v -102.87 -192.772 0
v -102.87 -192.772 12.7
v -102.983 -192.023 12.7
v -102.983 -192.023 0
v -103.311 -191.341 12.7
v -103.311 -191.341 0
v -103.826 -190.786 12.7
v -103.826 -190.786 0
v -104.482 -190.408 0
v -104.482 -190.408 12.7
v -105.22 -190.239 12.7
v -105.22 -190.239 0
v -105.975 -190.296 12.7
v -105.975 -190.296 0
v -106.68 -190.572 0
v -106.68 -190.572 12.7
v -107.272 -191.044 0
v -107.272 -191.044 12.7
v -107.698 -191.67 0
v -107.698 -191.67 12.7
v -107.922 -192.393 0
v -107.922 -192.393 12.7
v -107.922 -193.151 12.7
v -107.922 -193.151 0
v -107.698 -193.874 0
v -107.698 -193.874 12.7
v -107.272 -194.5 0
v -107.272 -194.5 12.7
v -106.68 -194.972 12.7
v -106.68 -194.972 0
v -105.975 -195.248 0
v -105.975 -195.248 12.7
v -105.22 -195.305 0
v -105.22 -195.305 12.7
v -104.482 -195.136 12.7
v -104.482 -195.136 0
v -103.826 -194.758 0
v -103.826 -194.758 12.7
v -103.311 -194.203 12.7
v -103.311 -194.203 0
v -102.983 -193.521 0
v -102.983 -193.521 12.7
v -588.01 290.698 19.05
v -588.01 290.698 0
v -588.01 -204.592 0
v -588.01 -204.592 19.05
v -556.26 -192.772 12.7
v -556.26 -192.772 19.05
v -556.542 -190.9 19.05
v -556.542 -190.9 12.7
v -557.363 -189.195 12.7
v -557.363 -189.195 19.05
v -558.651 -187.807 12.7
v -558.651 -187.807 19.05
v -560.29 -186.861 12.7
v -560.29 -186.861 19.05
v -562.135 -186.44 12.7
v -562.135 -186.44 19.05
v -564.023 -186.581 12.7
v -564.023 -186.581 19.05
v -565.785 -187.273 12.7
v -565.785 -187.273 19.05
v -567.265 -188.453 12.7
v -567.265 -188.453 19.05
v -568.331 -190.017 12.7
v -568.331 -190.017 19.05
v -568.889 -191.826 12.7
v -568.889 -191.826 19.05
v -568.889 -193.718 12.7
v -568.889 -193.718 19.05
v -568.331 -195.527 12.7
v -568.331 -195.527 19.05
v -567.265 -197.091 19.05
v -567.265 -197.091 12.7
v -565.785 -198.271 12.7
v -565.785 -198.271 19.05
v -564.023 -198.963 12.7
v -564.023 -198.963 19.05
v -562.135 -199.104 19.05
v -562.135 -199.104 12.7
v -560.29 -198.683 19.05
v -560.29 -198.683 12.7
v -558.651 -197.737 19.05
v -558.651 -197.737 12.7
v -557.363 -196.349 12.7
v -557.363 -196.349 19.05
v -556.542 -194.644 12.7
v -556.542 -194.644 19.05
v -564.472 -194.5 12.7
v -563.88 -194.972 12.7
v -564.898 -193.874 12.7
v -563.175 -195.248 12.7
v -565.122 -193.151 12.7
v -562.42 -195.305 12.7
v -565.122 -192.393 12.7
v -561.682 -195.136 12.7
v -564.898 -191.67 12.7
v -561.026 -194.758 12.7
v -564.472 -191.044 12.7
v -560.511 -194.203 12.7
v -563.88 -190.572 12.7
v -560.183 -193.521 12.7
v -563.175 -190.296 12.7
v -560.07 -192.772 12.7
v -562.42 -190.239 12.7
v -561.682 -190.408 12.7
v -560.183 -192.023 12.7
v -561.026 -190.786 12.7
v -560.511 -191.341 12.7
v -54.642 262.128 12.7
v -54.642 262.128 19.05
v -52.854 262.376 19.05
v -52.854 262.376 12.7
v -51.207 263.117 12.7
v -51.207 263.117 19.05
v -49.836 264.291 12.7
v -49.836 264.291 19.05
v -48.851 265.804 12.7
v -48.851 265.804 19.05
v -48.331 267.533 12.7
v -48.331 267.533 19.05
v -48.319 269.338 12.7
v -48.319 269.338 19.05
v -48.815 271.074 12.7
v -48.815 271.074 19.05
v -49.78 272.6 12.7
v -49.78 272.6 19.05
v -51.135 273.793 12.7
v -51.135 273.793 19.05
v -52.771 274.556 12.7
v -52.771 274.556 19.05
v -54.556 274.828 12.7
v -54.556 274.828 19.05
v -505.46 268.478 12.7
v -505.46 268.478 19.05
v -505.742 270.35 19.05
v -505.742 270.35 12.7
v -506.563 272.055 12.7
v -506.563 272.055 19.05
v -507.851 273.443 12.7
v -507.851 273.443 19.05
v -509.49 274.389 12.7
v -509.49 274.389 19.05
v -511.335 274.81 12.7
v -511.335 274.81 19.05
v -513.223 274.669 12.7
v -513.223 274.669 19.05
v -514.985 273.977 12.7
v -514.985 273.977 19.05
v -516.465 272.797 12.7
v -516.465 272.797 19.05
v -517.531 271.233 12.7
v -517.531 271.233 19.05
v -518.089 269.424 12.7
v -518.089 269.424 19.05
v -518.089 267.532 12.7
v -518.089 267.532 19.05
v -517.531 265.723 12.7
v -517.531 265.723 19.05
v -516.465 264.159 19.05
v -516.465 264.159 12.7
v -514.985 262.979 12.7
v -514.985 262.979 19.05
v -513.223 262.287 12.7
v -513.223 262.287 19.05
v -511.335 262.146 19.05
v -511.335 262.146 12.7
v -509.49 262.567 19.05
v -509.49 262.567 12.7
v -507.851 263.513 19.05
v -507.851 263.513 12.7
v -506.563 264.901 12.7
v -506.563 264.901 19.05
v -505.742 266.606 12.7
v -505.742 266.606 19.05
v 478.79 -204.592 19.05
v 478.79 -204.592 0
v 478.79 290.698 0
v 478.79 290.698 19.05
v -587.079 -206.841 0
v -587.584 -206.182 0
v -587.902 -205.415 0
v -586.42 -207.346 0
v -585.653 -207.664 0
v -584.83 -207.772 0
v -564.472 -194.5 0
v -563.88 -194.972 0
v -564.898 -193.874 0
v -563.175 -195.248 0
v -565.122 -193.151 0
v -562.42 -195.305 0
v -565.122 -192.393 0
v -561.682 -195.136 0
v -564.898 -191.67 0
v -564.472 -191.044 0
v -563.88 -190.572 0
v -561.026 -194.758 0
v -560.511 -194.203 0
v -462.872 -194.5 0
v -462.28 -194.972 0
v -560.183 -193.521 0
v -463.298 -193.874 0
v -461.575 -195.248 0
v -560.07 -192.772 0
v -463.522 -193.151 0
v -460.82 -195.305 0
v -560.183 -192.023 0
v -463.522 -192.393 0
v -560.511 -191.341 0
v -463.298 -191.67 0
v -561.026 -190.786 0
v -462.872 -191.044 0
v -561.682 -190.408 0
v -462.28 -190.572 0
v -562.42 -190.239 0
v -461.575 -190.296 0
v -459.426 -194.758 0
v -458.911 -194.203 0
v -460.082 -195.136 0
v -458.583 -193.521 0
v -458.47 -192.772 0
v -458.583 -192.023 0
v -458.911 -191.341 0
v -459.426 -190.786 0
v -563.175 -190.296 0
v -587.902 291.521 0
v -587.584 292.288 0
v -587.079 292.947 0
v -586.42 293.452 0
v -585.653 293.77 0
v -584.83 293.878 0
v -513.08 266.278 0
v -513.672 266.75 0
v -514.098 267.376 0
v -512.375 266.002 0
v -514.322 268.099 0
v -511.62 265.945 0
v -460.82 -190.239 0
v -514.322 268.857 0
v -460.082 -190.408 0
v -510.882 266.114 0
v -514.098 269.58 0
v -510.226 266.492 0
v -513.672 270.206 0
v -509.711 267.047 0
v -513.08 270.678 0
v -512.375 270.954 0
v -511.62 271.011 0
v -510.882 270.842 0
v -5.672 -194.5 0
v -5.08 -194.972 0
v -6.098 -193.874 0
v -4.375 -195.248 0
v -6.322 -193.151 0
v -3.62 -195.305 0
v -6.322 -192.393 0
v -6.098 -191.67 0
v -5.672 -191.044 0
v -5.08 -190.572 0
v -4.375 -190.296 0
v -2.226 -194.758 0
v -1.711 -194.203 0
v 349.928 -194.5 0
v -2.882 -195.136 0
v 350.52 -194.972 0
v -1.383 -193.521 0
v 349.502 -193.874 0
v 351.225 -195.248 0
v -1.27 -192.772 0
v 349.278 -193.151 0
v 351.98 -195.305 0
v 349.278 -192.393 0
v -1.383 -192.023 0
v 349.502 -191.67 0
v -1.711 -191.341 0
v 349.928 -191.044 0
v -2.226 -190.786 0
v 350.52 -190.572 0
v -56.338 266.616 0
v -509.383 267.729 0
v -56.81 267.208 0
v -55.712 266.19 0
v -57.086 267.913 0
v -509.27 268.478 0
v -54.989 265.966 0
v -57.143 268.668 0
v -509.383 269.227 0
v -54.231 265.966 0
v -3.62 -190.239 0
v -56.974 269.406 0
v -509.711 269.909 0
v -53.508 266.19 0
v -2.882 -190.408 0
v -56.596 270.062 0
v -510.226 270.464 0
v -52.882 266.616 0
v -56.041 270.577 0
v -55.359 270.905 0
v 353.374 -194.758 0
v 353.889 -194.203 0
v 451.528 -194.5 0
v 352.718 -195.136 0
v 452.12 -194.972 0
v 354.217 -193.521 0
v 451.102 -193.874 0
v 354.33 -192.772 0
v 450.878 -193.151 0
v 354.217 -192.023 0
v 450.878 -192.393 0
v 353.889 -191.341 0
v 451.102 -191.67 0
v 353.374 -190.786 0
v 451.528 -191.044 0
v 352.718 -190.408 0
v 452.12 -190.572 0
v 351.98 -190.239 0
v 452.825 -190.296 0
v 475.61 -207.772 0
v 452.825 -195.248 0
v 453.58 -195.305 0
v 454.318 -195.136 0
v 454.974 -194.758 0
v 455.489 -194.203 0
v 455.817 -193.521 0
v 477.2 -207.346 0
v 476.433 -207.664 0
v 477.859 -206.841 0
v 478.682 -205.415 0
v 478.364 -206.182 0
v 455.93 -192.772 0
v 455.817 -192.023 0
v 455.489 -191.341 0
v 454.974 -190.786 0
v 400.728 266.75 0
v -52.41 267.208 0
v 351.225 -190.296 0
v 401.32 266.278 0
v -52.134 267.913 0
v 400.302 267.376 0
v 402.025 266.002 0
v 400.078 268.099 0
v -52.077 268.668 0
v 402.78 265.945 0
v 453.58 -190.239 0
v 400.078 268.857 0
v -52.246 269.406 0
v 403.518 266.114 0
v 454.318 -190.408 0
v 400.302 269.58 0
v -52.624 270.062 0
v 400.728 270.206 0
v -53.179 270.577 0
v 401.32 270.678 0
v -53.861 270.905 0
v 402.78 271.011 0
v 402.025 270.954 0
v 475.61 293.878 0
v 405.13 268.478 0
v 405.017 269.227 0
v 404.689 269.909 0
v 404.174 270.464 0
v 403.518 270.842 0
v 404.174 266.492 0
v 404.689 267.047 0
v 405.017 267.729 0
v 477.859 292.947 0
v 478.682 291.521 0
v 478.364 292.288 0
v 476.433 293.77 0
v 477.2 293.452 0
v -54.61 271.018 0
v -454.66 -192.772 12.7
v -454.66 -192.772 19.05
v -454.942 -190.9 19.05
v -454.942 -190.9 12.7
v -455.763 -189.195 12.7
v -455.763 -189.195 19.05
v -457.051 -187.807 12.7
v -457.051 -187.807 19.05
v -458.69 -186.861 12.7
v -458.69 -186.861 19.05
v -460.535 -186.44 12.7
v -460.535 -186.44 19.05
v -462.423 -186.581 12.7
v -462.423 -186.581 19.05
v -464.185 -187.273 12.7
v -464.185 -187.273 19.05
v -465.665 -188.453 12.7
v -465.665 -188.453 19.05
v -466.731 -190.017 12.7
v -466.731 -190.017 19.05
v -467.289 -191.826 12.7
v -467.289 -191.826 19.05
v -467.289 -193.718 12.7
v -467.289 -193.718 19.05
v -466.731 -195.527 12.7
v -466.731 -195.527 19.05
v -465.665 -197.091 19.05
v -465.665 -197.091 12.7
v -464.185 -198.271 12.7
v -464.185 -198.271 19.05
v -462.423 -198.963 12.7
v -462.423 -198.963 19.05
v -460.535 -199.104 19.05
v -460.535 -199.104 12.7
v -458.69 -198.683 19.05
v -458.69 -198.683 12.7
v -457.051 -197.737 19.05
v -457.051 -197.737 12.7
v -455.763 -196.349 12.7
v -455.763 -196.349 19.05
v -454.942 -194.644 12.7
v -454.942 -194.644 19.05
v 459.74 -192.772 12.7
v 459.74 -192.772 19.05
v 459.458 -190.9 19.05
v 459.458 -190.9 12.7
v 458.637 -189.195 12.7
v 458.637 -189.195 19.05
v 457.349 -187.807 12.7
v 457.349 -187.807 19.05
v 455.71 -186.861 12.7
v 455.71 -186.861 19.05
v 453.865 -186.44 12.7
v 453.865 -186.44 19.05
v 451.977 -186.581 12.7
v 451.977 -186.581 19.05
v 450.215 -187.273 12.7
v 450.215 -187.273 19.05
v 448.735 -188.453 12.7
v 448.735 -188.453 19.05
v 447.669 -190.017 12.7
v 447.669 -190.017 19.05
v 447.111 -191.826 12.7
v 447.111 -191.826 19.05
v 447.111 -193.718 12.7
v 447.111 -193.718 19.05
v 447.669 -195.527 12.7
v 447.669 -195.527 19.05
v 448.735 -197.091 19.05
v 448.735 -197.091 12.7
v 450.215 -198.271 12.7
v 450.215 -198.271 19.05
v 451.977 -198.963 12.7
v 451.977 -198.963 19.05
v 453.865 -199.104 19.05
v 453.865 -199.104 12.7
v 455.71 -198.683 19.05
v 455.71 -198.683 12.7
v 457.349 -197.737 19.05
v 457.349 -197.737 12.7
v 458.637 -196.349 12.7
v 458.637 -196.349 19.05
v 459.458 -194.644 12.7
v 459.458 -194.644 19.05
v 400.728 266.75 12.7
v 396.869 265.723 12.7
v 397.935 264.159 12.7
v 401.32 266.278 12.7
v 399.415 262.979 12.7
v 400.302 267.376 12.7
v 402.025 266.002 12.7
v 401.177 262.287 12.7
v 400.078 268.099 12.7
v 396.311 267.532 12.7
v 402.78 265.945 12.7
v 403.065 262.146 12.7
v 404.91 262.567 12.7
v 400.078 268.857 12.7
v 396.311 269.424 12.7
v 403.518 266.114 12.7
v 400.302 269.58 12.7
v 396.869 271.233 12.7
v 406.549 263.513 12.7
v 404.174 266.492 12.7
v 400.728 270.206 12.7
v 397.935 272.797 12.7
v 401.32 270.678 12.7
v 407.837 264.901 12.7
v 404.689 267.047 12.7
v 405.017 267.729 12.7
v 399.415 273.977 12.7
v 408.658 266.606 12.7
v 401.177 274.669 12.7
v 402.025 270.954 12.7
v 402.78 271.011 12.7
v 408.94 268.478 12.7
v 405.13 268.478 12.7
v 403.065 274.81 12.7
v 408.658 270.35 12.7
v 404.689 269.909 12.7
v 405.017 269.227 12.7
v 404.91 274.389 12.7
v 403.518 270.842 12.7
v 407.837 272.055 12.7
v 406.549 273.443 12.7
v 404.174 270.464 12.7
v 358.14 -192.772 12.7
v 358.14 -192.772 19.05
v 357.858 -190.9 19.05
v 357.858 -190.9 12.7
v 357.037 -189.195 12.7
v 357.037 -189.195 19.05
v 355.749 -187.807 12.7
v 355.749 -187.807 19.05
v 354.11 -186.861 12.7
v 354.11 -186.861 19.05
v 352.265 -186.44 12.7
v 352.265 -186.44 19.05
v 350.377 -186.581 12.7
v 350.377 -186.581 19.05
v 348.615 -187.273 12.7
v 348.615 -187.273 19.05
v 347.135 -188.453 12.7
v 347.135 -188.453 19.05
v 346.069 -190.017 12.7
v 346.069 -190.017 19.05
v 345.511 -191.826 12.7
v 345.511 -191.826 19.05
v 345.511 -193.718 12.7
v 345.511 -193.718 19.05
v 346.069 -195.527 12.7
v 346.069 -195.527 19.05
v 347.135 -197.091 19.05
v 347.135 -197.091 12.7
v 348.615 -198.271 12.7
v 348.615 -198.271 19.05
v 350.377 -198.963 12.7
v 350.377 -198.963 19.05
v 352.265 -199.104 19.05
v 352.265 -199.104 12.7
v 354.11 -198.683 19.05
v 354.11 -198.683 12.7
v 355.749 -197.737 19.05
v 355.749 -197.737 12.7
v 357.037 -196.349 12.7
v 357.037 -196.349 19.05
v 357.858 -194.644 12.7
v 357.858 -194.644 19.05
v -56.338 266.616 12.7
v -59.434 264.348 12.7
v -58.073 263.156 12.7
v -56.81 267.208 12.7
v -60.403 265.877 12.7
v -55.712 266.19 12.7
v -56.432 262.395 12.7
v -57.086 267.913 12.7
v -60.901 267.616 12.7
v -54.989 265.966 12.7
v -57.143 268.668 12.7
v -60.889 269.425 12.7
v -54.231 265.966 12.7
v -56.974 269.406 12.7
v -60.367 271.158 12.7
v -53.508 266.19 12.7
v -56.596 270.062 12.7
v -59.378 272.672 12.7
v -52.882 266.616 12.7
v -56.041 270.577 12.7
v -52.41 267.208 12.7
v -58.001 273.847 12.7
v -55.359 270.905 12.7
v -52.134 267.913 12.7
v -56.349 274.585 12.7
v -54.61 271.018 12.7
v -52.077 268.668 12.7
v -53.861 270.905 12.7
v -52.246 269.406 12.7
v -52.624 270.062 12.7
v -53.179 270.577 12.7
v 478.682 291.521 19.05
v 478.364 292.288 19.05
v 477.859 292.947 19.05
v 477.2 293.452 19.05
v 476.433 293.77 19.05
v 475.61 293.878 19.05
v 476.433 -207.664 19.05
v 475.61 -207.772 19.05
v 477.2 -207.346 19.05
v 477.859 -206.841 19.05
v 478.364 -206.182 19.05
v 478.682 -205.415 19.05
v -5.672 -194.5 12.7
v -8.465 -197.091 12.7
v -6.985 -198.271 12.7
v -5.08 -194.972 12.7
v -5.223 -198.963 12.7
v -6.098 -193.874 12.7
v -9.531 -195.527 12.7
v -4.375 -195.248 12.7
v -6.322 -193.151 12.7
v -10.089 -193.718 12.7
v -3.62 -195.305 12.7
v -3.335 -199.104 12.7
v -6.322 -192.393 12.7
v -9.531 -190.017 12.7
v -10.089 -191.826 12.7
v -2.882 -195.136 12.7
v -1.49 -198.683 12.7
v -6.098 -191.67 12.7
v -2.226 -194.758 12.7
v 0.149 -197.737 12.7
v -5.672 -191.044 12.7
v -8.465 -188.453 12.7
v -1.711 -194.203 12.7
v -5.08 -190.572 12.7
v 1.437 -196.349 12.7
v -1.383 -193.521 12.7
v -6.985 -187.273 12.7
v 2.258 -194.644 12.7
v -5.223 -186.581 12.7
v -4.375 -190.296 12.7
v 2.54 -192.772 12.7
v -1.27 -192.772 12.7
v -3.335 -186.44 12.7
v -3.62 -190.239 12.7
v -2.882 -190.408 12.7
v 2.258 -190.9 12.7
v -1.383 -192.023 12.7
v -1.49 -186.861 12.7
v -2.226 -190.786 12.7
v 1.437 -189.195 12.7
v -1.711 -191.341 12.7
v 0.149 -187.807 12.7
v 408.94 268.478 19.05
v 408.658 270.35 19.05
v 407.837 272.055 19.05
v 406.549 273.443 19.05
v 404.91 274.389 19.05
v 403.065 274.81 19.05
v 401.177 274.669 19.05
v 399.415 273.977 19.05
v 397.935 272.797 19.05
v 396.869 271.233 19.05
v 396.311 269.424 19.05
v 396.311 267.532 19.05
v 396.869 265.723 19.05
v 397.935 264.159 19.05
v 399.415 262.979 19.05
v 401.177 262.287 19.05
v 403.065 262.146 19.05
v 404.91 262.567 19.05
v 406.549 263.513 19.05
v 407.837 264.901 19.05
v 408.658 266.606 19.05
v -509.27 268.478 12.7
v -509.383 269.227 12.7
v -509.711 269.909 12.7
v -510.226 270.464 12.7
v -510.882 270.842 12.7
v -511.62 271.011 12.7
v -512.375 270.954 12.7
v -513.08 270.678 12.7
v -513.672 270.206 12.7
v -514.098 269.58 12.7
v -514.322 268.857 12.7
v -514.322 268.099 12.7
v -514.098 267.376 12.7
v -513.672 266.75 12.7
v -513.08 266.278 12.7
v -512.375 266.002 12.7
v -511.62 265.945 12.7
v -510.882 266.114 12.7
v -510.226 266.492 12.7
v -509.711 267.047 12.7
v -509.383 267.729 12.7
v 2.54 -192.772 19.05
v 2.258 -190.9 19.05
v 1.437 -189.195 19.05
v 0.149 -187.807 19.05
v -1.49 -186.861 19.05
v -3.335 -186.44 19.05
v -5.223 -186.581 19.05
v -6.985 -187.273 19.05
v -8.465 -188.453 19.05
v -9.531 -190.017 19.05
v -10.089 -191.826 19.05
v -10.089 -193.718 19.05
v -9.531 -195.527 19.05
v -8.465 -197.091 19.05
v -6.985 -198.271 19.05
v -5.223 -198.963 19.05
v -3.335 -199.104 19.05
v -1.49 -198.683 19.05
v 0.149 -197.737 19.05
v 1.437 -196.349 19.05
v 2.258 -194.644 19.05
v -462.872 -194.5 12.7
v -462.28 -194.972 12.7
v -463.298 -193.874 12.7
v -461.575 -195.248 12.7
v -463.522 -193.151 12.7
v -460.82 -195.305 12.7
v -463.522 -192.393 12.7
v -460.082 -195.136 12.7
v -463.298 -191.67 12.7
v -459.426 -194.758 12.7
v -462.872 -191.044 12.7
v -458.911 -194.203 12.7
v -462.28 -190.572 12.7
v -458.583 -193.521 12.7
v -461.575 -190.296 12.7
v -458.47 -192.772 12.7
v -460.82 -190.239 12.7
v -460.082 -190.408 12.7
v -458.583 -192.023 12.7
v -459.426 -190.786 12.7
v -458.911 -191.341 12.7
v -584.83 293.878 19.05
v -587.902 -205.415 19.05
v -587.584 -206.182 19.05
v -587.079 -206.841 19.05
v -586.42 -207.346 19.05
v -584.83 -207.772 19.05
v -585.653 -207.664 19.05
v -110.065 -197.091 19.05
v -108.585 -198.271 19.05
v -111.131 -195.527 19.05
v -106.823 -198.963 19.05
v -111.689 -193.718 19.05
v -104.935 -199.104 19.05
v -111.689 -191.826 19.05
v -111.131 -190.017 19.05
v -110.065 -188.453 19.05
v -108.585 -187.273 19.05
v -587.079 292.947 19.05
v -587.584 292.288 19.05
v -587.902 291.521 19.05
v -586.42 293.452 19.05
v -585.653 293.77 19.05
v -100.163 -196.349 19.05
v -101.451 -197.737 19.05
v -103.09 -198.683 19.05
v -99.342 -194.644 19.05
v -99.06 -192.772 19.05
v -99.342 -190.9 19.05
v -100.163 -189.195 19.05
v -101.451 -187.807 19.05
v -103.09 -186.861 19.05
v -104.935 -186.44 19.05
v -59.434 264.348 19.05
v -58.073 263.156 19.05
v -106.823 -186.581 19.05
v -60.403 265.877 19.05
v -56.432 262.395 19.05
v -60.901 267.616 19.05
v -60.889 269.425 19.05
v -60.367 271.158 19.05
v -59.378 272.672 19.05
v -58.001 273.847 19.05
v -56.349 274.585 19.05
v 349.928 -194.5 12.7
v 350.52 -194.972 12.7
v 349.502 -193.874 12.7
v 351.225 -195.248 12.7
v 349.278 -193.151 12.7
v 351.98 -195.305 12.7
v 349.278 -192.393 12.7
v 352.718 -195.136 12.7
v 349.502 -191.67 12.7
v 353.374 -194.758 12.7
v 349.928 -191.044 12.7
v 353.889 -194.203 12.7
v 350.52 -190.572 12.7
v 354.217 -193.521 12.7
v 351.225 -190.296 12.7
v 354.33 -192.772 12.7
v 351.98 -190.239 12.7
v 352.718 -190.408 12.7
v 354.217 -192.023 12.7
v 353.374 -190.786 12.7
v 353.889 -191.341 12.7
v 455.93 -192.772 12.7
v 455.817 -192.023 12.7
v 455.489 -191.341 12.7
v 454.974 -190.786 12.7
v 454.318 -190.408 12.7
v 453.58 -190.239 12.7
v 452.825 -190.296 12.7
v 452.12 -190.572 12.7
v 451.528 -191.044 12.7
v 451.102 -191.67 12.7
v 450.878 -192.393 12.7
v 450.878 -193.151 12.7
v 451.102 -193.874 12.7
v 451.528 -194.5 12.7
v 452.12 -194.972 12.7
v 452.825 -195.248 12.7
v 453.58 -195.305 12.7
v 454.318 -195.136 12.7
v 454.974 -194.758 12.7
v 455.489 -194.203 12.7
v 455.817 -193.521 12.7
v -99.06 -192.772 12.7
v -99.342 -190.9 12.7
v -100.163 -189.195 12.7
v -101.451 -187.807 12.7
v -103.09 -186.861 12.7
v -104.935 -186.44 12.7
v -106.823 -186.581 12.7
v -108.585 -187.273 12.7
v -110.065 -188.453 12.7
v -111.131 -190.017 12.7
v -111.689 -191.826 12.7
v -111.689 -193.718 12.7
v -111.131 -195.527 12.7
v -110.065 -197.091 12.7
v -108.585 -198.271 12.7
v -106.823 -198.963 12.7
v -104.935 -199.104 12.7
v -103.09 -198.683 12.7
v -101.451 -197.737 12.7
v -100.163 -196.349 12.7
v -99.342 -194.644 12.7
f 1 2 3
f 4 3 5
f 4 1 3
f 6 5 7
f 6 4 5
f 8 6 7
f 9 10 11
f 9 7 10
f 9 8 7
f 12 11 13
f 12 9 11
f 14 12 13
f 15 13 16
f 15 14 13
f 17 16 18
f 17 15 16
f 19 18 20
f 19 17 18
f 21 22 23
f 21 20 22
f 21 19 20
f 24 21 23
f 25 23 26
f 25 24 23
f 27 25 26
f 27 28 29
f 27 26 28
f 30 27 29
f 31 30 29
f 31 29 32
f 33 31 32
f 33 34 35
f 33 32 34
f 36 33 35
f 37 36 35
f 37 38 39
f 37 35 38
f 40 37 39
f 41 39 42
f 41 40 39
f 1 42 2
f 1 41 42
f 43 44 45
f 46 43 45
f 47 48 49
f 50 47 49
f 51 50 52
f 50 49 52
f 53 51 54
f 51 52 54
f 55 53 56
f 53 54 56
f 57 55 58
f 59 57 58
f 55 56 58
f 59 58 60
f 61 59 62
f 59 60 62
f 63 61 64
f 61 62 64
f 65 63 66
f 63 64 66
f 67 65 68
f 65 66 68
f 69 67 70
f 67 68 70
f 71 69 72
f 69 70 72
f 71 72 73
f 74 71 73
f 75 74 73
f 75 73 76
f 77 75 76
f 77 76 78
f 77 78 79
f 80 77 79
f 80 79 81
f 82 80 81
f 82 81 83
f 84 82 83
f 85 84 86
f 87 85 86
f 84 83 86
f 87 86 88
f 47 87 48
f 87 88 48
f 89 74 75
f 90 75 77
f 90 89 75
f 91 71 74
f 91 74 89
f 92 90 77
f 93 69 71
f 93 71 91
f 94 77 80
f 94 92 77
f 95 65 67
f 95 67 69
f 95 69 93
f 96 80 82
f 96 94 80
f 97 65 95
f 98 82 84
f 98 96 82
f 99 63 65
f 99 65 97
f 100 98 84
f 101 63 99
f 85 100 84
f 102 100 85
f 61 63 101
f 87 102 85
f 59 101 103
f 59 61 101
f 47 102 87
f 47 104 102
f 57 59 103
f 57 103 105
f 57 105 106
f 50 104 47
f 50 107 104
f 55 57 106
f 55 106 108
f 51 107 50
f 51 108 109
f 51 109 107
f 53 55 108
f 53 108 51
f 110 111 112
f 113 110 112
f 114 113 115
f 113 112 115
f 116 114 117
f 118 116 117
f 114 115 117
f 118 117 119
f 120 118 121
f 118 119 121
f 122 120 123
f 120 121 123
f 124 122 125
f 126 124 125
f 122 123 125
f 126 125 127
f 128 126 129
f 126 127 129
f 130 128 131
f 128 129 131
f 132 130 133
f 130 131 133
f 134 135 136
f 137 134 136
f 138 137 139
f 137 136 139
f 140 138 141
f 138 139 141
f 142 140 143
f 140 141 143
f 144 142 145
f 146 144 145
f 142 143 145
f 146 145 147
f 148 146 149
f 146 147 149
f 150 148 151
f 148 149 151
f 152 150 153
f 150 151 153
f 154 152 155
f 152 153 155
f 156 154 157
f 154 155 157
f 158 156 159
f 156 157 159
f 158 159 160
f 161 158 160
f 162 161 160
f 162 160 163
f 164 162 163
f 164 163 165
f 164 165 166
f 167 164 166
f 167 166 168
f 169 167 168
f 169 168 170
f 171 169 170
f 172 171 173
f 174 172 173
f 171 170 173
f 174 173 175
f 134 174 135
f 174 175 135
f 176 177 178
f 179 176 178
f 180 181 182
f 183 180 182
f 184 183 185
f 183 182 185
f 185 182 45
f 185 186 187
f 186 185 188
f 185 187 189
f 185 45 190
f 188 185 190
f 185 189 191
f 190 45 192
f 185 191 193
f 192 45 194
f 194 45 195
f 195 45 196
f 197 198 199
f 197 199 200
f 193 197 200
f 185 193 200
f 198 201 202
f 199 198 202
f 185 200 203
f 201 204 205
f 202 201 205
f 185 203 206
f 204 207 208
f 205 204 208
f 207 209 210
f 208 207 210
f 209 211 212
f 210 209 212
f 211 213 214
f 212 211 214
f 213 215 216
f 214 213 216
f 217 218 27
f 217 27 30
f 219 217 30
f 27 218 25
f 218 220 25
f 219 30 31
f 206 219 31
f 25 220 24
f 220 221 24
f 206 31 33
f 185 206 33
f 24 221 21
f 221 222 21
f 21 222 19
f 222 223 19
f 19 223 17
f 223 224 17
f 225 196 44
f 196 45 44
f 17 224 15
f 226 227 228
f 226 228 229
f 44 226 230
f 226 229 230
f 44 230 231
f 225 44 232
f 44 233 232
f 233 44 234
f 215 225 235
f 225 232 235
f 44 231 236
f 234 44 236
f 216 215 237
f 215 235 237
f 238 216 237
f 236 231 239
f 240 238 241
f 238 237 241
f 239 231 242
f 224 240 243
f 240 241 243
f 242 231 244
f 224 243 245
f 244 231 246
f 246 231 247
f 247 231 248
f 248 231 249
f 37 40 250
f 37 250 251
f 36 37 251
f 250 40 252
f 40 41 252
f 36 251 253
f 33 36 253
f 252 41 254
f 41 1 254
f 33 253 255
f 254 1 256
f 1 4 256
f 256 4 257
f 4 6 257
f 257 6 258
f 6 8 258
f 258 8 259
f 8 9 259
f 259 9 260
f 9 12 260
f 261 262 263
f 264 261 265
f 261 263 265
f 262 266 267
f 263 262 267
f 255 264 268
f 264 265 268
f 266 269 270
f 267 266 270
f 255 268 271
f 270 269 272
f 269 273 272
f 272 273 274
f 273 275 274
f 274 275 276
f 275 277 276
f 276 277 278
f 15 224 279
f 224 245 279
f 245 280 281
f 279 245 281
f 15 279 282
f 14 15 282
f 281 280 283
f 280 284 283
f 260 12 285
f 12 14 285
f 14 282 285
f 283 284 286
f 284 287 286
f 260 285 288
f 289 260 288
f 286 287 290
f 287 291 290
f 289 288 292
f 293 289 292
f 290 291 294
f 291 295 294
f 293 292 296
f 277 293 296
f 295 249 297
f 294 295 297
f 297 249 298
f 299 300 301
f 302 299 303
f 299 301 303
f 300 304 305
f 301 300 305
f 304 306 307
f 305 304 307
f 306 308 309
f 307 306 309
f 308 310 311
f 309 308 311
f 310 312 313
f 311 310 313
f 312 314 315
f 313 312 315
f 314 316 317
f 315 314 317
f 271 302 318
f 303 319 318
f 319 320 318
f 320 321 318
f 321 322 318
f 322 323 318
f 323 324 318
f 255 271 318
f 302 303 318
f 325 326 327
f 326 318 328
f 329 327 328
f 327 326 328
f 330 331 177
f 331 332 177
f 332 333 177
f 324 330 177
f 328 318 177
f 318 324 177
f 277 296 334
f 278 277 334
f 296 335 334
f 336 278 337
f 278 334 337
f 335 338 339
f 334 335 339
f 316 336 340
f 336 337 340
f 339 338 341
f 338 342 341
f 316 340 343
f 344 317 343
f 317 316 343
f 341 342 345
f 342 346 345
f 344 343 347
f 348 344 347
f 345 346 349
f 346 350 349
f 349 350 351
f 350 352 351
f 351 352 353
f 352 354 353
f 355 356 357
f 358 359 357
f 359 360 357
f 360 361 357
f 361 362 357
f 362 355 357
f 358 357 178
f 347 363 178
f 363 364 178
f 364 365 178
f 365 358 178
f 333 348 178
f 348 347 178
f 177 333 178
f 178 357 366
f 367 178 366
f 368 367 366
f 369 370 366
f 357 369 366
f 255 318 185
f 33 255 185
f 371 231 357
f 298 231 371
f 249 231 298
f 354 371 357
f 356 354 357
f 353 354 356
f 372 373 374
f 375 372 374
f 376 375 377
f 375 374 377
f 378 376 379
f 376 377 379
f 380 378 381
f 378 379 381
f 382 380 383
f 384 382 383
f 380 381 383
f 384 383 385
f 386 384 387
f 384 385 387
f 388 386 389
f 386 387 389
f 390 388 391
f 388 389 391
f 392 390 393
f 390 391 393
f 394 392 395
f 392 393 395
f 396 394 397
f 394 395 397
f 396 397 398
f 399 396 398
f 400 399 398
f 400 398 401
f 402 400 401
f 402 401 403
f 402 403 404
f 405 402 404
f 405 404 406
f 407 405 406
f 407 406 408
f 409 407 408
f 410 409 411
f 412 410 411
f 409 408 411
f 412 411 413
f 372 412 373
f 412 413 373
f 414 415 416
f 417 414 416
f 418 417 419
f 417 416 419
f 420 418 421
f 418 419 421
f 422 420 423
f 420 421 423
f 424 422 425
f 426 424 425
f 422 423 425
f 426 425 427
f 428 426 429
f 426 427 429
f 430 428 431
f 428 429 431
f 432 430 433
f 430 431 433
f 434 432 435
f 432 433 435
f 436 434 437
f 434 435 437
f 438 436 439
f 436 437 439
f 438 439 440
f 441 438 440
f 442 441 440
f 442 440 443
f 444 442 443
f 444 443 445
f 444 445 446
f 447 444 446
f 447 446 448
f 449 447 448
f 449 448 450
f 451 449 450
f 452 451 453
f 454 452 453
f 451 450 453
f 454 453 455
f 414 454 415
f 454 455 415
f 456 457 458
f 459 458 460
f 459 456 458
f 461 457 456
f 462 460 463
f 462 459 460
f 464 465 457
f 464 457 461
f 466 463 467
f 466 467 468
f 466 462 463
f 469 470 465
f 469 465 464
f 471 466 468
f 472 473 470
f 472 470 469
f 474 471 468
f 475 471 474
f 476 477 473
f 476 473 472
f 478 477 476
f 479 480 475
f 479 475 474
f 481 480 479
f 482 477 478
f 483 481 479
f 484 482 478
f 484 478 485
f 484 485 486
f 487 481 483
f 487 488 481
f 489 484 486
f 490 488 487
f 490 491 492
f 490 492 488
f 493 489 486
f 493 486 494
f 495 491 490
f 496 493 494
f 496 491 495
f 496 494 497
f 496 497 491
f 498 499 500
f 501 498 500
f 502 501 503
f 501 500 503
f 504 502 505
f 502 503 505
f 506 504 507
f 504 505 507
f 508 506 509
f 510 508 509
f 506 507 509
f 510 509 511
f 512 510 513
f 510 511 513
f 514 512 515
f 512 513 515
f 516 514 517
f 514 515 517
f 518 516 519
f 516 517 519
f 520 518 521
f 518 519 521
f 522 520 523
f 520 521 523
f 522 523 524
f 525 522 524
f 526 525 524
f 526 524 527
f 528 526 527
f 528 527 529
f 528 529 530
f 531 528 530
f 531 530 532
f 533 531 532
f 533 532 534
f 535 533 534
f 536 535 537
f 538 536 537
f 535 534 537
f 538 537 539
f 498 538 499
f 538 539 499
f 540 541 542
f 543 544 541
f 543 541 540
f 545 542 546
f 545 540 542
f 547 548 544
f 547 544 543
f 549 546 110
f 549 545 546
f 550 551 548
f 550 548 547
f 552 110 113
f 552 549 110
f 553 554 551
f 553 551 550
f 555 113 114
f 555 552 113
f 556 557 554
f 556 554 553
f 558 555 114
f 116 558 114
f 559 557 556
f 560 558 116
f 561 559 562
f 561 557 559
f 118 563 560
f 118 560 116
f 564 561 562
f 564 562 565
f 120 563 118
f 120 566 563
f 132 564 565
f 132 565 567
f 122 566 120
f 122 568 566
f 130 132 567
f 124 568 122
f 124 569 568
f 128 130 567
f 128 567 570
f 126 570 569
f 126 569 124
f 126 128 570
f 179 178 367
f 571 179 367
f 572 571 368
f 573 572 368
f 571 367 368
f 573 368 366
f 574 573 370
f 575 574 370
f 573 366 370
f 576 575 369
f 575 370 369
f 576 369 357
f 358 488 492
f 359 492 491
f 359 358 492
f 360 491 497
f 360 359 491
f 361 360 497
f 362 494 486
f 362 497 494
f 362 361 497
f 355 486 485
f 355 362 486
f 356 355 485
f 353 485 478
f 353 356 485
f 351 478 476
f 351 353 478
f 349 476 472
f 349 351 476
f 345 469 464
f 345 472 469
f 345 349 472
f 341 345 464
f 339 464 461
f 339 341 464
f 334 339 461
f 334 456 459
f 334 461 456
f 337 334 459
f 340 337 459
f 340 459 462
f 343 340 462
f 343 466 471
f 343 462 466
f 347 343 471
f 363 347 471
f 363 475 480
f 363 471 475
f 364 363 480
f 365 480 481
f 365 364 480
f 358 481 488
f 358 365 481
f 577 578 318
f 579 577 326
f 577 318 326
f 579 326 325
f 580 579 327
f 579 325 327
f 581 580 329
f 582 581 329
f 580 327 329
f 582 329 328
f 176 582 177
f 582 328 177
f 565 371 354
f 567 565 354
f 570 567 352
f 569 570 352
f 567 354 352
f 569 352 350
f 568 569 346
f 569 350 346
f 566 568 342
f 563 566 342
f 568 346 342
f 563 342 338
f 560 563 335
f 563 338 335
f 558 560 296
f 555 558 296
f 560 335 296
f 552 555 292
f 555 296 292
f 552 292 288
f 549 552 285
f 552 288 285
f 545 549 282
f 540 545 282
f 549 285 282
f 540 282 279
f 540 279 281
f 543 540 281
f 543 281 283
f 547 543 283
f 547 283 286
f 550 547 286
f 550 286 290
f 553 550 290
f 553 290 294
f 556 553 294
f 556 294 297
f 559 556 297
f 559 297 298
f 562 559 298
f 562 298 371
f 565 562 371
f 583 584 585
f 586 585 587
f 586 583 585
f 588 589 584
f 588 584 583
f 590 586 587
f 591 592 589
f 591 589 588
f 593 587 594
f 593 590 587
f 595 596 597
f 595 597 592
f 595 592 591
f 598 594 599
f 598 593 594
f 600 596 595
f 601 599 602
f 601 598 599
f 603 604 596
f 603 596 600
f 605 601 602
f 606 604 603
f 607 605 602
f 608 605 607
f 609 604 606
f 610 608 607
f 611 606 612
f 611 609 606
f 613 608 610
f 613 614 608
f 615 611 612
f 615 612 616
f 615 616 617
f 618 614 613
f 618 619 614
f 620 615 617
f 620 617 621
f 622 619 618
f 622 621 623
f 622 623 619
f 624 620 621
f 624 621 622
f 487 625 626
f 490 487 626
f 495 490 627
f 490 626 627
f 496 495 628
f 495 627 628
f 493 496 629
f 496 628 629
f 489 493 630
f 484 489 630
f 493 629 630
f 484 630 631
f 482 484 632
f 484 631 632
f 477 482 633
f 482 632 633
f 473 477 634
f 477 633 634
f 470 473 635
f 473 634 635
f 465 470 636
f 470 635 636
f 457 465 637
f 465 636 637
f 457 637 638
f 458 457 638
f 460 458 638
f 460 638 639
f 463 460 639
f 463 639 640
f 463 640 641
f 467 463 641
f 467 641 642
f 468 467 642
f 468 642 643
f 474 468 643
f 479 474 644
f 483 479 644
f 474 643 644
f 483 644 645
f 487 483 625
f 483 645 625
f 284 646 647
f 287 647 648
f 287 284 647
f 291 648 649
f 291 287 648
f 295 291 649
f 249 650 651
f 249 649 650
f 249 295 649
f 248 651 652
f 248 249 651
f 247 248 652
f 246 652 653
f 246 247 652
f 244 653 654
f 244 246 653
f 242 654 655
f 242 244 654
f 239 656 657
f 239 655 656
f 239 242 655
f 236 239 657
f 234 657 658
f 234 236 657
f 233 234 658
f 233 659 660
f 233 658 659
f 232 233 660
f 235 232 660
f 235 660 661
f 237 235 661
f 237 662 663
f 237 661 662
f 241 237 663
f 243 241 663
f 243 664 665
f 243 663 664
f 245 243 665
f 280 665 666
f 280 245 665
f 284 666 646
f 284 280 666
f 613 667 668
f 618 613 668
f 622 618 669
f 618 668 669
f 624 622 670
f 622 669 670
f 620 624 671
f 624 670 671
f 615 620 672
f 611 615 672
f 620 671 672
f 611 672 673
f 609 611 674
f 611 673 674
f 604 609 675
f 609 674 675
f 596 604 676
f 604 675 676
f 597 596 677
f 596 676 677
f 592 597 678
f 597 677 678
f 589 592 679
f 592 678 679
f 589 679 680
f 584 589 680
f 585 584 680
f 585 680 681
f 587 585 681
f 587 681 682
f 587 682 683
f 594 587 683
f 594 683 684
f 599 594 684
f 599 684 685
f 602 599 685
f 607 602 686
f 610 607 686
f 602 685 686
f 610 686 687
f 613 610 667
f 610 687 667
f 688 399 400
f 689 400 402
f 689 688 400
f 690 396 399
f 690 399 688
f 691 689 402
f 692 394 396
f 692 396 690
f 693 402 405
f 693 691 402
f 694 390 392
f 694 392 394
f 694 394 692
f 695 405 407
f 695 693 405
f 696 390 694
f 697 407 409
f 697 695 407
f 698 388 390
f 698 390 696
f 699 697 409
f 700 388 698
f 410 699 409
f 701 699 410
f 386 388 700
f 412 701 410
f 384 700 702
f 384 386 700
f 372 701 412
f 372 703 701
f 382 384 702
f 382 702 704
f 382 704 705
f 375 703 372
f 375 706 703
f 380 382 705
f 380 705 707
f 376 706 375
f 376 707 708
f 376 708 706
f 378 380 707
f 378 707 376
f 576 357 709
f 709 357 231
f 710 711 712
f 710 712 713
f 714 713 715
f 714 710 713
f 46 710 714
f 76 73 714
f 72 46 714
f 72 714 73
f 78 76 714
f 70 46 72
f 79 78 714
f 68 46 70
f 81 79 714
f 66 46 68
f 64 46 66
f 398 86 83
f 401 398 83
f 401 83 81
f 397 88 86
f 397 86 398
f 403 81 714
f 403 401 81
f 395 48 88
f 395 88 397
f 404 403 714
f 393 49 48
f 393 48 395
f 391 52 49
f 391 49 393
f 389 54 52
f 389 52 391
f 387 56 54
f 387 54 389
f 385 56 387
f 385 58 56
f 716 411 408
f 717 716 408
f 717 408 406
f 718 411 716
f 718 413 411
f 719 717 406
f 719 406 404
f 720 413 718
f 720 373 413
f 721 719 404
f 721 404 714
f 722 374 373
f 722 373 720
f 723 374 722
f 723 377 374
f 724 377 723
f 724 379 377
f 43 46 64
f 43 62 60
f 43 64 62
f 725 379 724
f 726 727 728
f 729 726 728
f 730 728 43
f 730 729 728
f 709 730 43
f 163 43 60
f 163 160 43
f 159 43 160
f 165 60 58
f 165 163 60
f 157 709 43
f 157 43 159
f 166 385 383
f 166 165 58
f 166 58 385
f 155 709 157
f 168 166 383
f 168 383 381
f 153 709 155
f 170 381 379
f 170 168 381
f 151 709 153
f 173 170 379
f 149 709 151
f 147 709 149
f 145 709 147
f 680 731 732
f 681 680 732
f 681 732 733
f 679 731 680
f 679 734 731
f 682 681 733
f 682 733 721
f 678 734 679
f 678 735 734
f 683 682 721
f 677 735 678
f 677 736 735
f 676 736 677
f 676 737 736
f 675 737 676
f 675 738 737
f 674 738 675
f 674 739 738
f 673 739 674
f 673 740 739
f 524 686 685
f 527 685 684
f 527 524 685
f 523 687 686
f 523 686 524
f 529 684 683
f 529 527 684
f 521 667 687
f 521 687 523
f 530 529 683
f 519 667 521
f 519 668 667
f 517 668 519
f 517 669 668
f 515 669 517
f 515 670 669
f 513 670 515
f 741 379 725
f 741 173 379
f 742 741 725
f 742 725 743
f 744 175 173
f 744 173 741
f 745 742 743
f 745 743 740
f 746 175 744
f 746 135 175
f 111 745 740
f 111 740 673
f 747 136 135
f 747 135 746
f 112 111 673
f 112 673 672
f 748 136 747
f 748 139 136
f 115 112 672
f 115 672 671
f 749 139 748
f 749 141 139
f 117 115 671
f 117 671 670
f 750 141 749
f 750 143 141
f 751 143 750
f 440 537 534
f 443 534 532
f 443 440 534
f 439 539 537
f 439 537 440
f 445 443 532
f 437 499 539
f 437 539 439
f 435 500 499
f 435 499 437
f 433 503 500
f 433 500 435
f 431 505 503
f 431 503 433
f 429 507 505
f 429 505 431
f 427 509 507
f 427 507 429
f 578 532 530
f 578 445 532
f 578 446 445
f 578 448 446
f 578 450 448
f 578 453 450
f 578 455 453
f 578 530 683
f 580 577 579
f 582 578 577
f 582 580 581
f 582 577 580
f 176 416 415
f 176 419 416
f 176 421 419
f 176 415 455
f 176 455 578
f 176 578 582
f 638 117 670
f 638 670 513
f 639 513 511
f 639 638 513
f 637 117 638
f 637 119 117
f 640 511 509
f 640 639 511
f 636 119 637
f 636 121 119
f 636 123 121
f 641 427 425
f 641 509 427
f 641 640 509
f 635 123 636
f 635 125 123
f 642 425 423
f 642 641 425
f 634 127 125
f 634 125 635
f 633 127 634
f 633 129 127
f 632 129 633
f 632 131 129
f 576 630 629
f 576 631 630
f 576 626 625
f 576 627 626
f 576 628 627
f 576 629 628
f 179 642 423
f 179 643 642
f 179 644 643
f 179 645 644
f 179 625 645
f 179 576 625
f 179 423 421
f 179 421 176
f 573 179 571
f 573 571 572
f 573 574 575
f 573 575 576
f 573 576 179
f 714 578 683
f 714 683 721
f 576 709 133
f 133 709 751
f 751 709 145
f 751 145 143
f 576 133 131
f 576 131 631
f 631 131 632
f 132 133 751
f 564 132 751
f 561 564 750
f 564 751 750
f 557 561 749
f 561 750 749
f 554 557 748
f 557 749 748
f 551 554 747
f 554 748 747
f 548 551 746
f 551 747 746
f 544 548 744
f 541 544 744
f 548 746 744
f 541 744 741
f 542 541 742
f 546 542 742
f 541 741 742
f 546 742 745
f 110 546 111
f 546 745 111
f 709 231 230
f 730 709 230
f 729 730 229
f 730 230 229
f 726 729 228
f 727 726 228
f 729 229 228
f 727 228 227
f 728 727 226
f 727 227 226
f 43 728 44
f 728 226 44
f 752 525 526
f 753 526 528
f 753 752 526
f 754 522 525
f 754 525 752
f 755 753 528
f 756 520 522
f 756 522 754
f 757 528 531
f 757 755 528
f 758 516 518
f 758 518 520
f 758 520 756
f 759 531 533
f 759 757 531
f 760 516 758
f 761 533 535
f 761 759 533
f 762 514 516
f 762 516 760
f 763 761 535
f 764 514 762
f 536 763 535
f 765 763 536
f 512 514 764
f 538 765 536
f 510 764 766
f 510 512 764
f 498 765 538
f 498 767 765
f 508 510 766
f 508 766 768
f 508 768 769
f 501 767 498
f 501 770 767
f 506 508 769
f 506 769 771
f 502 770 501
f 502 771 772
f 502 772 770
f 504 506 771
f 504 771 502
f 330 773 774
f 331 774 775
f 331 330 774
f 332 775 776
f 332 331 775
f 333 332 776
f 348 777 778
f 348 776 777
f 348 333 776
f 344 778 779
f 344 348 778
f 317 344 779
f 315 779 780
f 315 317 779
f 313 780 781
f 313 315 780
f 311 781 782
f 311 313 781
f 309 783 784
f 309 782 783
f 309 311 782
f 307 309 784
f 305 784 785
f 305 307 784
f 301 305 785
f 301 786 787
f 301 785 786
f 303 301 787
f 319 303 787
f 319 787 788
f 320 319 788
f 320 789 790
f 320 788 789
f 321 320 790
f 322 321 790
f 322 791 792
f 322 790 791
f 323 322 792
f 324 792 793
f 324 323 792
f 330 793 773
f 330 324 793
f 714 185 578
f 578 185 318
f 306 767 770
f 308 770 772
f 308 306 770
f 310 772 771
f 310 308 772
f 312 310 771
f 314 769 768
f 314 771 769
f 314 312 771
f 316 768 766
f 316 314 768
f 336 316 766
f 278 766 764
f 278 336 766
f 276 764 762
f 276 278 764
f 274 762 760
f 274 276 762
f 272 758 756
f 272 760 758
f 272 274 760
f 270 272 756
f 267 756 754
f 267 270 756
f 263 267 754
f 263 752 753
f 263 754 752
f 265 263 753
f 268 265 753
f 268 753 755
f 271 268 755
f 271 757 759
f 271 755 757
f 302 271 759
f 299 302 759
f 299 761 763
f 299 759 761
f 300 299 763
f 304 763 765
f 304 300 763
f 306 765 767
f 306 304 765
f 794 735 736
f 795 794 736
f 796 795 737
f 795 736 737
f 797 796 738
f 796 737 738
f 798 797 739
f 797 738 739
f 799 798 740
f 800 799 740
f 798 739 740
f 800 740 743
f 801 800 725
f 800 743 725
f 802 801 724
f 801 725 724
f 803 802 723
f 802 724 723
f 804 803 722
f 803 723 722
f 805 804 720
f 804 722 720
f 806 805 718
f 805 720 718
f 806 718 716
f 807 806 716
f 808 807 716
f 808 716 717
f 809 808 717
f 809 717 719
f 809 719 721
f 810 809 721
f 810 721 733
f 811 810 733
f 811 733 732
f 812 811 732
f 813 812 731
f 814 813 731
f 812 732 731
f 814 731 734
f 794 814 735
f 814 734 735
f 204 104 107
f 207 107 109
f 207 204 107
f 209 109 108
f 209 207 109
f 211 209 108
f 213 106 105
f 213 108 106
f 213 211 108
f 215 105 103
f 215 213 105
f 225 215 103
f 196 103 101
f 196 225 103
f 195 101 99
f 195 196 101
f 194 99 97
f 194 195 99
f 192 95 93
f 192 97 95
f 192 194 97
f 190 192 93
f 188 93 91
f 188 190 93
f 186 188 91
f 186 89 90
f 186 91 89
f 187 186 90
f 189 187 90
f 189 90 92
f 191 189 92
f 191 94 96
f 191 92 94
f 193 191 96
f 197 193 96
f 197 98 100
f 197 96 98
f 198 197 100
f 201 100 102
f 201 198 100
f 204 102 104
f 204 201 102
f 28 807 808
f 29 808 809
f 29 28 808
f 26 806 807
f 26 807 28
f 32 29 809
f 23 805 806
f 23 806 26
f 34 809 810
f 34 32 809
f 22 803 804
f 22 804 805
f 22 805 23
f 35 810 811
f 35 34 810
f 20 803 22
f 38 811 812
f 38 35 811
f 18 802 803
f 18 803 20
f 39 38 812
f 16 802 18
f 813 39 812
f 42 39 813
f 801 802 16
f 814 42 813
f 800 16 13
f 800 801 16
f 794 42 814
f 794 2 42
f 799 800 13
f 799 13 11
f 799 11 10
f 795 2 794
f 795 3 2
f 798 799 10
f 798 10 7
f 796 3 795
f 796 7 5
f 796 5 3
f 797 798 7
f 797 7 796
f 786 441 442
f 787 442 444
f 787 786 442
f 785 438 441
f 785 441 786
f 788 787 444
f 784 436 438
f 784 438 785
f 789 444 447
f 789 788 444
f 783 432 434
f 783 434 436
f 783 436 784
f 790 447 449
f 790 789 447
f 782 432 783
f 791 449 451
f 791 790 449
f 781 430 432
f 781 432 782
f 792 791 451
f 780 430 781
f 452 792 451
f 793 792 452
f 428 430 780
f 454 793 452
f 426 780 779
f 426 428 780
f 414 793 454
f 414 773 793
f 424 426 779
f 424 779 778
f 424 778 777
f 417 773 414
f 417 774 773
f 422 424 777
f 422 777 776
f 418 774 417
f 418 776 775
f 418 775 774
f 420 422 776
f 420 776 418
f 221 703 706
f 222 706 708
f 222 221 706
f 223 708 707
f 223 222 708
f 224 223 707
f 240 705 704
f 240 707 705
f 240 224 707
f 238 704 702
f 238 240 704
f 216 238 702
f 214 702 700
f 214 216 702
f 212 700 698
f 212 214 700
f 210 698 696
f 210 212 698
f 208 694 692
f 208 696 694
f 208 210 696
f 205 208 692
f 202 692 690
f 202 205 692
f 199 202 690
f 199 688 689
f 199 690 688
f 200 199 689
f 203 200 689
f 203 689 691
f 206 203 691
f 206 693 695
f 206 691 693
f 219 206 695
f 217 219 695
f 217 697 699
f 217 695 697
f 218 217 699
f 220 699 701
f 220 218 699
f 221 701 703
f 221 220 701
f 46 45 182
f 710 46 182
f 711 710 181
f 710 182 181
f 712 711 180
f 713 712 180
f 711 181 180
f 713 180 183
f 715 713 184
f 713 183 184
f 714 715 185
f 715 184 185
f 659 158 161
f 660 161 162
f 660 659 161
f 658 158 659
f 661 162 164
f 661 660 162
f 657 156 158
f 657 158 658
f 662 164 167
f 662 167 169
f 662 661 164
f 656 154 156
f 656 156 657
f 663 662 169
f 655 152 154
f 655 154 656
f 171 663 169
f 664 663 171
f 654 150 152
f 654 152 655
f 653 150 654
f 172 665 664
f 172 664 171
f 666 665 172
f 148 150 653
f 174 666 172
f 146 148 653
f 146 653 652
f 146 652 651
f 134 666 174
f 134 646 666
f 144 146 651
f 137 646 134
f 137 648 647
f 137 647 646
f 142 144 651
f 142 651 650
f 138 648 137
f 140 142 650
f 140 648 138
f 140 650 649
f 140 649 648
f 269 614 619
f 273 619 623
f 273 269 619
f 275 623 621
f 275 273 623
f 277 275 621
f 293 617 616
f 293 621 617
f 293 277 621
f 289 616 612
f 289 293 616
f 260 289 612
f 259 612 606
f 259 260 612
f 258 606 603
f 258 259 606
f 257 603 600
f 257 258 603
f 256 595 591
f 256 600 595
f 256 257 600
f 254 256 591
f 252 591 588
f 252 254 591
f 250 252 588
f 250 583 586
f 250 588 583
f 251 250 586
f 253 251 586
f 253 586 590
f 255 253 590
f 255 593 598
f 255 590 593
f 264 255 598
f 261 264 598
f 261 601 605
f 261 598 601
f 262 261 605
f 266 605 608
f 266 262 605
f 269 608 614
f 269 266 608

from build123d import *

# Parameters (mm, degrees)
F2_R     = 6.35
F2_R_2   = 2.54
F3_DEPTH = 19.05
F4_R     = 6.35
F5_DEPTH = 6.35


with BuildPart() as f3:
    # F2 (on Top) → F3 (new body)
    with BuildSketch(Plane.XY):
        with BuildLine():
            Line((-54.610017, 293.878014), (-584.830017, 293.878014))
            ThreePointArc((-584.830017, 293.878014), (-587.078617, 292.946614), (-588.010017, 290.698014))
            Line((-588.010017, 290.698014), (-588.010017, 43.053014))
            Line((-588.010017, 43.053014), (-588.010017, -204.591986))
            ThreePointArc((-588.010017, -204.591986), (-587.078617, -206.840586), (-584.830017, -207.771986))
            Line((-584.830017, -207.771986), (-54.610017, -207.771986))
            Line((-54.610017, -207.771986), (475.609983, -207.771986))
            ThreePointArc((475.609983, -207.771986), (477.858583, -206.840586), (478.789983, -204.591986))
            Line((478.789983, -204.591986), (478.789983, 43.053014))
            Line((478.789983, 43.053014), (478.789983, 290.698014))
            ThreePointArc((478.789983, 290.698014), (477.858583, 292.946614), (475.609983, 293.878014))
            Line((475.609983, 293.878014), (-54.610017, 293.878014))
        make_face()
        with Locations((-562.610017, -192.771986)):
            Circle(F2_R, mode=Mode.SUBTRACT)
        with Locations((-461.010017, -192.771986)):
            Circle(F2_R, mode=Mode.SUBTRACT)
        with Locations((-105.410017, -192.771986)):
            Circle(F2_R, mode=Mode.SUBTRACT)
        with Locations((-3.810017, -192.771986)):
            Circle(F2_R, mode=Mode.SUBTRACT)
        with Locations((351.789983, -192.771986)):
            Circle(F2_R, mode=Mode.SUBTRACT)
        with Locations((453.389983, -192.771986)):
            Circle(F2_R, mode=Mode.SUBTRACT)
        with Locations((-511.810017, 268.478014)):
            Circle(F2_R, mode=Mode.SUBTRACT)
        with BuildLine():
            ThreePointArc((-54.663885, 274.827786), (-54.610017, 274.828014), (-54.556149, 274.827786))
            ThreePointArc((-54.556149, 274.827786), (-48.260026, 268.467072), (-54.578033, 262.128095))
            ThreePointArc((-54.578033, 262.128095), (-54.610017, 262.128014), (-54.642001, 262.128095))
            ThreePointArc((-54.642001, 262.128095), (-60.960008, 268.467072), (-54.663885, 274.827786))
        make_face(mode=Mode.SUBTRACT)
        with Locations((402.589983, 268.478014)):
            Circle(F2_R, mode=Mode.SUBTRACT)
        with Locations((-511.810017, 268.478014)):
            Circle(F2_R)
        with Locations((-511.810017, 268.478014)):
            Circle(F2_R_2, mode=Mode.SUBTRACT)
        with BuildLine():
            ThreePointArc((-54.578033, 262.128095), (-48.260026, 268.467072), (-54.556149, 274.827786))
            ThreePointArc((-54.556149, 274.827786), (-54.610017, 274.828014), (-54.663885, 274.827786))
            ThreePointArc((-54.663885, 274.827786), (-60.960008, 268.467072), (-54.642001, 262.128095))
            ThreePointArc((-54.642001, 262.128095), (-54.610017, 262.128014), (-54.578033, 262.128095))
        make_face()
        with BuildLine():
            ThreePointArc((-54.610017, 265.938014), (-57.150017, 268.478014), (-54.610017, 271.018014))
            ThreePointArc((-54.610017, 271.018014), (-52.070017, 268.478014), (-54.610017, 265.938014))
        make_face(mode=Mode.SUBTRACT)
        with Locations((402.589983, 268.478014)):
            Circle(F2_R)
        with Locations((402.589983, 268.478014)):
            Circle(F2_R_2, mode=Mode.SUBTRACT)
        with Locations((453.389983, -192.771986)):
            Circle(F2_R)
        with Locations((453.389983, -192.771986)):
            Circle(F2_R_2, mode=Mode.SUBTRACT)
        with Locations((351.789983, -192.771986)):
            Circle(F2_R)
        with Locations((351.789983, -192.771986)):
            Circle(F2_R_2, mode=Mode.SUBTRACT)
        with Locations((-3.810017, -192.771986)):
            Circle(F2_R)
        with Locations((-3.810017, -192.771986)):
            Circle(F2_R_2, mode=Mode.SUBTRACT)
        with Locations((-105.410017, -192.771986)):
            Circle(F2_R)
        with Locations((-105.410017, -192.771986)):
            Circle(F2_R_2, mode=Mode.SUBTRACT)
        with Locations((-461.010017, -192.771986)):
            Circle(F2_R)
        with Locations((-461.010017, -192.771986)):
            Circle(F2_R_2, mode=Mode.SUBTRACT)
        with Locations((-562.610017, -192.771986)):
            Circle(F2_R)
        with Locations((-562.610017, -192.771986)):
            Circle(F2_R_2, mode=Mode.SUBTRACT)
    extrude(amount=F3_DEPTH)

    # F4 (on face) → F5 (cut)
    with BuildSketch(Plane.XY.offset(19.05)):
        with Locations((-511.810017, 268.478014)):
            Circle(F4_R)
        with BuildLine():
            ThreePointArc((-54.556149, 274.827786), (-60.959872, 268.52094), (-54.642001, 262.128095))
            ThreePointArc((-54.642001, 262.128095), (-48.260162, 268.435088), (-54.556149, 274.827786))
        make_face()
        with Locations((402.589983, 268.478014)):
            Circle(F4_R)
        with Locations((453.389983, -192.771986)):
            Circle(F4_R)
        with Locations((351.789983, -192.771986)):
            Circle(F4_R)
        with Locations((-3.810017, -192.771986)):
            Circle(F4_R)
        with Locations((-105.410017, -192.771986)):
            Circle(F4_R)
        with Locations((-461.010017, -192.771986)):
            Circle(F4_R)
        with Locations((-562.610017, -192.771986)):
            Circle(F4_R)
    extrude(amount=-F5_DEPTH, mode=Mode.SUBTRACT)


solid = f3.part
